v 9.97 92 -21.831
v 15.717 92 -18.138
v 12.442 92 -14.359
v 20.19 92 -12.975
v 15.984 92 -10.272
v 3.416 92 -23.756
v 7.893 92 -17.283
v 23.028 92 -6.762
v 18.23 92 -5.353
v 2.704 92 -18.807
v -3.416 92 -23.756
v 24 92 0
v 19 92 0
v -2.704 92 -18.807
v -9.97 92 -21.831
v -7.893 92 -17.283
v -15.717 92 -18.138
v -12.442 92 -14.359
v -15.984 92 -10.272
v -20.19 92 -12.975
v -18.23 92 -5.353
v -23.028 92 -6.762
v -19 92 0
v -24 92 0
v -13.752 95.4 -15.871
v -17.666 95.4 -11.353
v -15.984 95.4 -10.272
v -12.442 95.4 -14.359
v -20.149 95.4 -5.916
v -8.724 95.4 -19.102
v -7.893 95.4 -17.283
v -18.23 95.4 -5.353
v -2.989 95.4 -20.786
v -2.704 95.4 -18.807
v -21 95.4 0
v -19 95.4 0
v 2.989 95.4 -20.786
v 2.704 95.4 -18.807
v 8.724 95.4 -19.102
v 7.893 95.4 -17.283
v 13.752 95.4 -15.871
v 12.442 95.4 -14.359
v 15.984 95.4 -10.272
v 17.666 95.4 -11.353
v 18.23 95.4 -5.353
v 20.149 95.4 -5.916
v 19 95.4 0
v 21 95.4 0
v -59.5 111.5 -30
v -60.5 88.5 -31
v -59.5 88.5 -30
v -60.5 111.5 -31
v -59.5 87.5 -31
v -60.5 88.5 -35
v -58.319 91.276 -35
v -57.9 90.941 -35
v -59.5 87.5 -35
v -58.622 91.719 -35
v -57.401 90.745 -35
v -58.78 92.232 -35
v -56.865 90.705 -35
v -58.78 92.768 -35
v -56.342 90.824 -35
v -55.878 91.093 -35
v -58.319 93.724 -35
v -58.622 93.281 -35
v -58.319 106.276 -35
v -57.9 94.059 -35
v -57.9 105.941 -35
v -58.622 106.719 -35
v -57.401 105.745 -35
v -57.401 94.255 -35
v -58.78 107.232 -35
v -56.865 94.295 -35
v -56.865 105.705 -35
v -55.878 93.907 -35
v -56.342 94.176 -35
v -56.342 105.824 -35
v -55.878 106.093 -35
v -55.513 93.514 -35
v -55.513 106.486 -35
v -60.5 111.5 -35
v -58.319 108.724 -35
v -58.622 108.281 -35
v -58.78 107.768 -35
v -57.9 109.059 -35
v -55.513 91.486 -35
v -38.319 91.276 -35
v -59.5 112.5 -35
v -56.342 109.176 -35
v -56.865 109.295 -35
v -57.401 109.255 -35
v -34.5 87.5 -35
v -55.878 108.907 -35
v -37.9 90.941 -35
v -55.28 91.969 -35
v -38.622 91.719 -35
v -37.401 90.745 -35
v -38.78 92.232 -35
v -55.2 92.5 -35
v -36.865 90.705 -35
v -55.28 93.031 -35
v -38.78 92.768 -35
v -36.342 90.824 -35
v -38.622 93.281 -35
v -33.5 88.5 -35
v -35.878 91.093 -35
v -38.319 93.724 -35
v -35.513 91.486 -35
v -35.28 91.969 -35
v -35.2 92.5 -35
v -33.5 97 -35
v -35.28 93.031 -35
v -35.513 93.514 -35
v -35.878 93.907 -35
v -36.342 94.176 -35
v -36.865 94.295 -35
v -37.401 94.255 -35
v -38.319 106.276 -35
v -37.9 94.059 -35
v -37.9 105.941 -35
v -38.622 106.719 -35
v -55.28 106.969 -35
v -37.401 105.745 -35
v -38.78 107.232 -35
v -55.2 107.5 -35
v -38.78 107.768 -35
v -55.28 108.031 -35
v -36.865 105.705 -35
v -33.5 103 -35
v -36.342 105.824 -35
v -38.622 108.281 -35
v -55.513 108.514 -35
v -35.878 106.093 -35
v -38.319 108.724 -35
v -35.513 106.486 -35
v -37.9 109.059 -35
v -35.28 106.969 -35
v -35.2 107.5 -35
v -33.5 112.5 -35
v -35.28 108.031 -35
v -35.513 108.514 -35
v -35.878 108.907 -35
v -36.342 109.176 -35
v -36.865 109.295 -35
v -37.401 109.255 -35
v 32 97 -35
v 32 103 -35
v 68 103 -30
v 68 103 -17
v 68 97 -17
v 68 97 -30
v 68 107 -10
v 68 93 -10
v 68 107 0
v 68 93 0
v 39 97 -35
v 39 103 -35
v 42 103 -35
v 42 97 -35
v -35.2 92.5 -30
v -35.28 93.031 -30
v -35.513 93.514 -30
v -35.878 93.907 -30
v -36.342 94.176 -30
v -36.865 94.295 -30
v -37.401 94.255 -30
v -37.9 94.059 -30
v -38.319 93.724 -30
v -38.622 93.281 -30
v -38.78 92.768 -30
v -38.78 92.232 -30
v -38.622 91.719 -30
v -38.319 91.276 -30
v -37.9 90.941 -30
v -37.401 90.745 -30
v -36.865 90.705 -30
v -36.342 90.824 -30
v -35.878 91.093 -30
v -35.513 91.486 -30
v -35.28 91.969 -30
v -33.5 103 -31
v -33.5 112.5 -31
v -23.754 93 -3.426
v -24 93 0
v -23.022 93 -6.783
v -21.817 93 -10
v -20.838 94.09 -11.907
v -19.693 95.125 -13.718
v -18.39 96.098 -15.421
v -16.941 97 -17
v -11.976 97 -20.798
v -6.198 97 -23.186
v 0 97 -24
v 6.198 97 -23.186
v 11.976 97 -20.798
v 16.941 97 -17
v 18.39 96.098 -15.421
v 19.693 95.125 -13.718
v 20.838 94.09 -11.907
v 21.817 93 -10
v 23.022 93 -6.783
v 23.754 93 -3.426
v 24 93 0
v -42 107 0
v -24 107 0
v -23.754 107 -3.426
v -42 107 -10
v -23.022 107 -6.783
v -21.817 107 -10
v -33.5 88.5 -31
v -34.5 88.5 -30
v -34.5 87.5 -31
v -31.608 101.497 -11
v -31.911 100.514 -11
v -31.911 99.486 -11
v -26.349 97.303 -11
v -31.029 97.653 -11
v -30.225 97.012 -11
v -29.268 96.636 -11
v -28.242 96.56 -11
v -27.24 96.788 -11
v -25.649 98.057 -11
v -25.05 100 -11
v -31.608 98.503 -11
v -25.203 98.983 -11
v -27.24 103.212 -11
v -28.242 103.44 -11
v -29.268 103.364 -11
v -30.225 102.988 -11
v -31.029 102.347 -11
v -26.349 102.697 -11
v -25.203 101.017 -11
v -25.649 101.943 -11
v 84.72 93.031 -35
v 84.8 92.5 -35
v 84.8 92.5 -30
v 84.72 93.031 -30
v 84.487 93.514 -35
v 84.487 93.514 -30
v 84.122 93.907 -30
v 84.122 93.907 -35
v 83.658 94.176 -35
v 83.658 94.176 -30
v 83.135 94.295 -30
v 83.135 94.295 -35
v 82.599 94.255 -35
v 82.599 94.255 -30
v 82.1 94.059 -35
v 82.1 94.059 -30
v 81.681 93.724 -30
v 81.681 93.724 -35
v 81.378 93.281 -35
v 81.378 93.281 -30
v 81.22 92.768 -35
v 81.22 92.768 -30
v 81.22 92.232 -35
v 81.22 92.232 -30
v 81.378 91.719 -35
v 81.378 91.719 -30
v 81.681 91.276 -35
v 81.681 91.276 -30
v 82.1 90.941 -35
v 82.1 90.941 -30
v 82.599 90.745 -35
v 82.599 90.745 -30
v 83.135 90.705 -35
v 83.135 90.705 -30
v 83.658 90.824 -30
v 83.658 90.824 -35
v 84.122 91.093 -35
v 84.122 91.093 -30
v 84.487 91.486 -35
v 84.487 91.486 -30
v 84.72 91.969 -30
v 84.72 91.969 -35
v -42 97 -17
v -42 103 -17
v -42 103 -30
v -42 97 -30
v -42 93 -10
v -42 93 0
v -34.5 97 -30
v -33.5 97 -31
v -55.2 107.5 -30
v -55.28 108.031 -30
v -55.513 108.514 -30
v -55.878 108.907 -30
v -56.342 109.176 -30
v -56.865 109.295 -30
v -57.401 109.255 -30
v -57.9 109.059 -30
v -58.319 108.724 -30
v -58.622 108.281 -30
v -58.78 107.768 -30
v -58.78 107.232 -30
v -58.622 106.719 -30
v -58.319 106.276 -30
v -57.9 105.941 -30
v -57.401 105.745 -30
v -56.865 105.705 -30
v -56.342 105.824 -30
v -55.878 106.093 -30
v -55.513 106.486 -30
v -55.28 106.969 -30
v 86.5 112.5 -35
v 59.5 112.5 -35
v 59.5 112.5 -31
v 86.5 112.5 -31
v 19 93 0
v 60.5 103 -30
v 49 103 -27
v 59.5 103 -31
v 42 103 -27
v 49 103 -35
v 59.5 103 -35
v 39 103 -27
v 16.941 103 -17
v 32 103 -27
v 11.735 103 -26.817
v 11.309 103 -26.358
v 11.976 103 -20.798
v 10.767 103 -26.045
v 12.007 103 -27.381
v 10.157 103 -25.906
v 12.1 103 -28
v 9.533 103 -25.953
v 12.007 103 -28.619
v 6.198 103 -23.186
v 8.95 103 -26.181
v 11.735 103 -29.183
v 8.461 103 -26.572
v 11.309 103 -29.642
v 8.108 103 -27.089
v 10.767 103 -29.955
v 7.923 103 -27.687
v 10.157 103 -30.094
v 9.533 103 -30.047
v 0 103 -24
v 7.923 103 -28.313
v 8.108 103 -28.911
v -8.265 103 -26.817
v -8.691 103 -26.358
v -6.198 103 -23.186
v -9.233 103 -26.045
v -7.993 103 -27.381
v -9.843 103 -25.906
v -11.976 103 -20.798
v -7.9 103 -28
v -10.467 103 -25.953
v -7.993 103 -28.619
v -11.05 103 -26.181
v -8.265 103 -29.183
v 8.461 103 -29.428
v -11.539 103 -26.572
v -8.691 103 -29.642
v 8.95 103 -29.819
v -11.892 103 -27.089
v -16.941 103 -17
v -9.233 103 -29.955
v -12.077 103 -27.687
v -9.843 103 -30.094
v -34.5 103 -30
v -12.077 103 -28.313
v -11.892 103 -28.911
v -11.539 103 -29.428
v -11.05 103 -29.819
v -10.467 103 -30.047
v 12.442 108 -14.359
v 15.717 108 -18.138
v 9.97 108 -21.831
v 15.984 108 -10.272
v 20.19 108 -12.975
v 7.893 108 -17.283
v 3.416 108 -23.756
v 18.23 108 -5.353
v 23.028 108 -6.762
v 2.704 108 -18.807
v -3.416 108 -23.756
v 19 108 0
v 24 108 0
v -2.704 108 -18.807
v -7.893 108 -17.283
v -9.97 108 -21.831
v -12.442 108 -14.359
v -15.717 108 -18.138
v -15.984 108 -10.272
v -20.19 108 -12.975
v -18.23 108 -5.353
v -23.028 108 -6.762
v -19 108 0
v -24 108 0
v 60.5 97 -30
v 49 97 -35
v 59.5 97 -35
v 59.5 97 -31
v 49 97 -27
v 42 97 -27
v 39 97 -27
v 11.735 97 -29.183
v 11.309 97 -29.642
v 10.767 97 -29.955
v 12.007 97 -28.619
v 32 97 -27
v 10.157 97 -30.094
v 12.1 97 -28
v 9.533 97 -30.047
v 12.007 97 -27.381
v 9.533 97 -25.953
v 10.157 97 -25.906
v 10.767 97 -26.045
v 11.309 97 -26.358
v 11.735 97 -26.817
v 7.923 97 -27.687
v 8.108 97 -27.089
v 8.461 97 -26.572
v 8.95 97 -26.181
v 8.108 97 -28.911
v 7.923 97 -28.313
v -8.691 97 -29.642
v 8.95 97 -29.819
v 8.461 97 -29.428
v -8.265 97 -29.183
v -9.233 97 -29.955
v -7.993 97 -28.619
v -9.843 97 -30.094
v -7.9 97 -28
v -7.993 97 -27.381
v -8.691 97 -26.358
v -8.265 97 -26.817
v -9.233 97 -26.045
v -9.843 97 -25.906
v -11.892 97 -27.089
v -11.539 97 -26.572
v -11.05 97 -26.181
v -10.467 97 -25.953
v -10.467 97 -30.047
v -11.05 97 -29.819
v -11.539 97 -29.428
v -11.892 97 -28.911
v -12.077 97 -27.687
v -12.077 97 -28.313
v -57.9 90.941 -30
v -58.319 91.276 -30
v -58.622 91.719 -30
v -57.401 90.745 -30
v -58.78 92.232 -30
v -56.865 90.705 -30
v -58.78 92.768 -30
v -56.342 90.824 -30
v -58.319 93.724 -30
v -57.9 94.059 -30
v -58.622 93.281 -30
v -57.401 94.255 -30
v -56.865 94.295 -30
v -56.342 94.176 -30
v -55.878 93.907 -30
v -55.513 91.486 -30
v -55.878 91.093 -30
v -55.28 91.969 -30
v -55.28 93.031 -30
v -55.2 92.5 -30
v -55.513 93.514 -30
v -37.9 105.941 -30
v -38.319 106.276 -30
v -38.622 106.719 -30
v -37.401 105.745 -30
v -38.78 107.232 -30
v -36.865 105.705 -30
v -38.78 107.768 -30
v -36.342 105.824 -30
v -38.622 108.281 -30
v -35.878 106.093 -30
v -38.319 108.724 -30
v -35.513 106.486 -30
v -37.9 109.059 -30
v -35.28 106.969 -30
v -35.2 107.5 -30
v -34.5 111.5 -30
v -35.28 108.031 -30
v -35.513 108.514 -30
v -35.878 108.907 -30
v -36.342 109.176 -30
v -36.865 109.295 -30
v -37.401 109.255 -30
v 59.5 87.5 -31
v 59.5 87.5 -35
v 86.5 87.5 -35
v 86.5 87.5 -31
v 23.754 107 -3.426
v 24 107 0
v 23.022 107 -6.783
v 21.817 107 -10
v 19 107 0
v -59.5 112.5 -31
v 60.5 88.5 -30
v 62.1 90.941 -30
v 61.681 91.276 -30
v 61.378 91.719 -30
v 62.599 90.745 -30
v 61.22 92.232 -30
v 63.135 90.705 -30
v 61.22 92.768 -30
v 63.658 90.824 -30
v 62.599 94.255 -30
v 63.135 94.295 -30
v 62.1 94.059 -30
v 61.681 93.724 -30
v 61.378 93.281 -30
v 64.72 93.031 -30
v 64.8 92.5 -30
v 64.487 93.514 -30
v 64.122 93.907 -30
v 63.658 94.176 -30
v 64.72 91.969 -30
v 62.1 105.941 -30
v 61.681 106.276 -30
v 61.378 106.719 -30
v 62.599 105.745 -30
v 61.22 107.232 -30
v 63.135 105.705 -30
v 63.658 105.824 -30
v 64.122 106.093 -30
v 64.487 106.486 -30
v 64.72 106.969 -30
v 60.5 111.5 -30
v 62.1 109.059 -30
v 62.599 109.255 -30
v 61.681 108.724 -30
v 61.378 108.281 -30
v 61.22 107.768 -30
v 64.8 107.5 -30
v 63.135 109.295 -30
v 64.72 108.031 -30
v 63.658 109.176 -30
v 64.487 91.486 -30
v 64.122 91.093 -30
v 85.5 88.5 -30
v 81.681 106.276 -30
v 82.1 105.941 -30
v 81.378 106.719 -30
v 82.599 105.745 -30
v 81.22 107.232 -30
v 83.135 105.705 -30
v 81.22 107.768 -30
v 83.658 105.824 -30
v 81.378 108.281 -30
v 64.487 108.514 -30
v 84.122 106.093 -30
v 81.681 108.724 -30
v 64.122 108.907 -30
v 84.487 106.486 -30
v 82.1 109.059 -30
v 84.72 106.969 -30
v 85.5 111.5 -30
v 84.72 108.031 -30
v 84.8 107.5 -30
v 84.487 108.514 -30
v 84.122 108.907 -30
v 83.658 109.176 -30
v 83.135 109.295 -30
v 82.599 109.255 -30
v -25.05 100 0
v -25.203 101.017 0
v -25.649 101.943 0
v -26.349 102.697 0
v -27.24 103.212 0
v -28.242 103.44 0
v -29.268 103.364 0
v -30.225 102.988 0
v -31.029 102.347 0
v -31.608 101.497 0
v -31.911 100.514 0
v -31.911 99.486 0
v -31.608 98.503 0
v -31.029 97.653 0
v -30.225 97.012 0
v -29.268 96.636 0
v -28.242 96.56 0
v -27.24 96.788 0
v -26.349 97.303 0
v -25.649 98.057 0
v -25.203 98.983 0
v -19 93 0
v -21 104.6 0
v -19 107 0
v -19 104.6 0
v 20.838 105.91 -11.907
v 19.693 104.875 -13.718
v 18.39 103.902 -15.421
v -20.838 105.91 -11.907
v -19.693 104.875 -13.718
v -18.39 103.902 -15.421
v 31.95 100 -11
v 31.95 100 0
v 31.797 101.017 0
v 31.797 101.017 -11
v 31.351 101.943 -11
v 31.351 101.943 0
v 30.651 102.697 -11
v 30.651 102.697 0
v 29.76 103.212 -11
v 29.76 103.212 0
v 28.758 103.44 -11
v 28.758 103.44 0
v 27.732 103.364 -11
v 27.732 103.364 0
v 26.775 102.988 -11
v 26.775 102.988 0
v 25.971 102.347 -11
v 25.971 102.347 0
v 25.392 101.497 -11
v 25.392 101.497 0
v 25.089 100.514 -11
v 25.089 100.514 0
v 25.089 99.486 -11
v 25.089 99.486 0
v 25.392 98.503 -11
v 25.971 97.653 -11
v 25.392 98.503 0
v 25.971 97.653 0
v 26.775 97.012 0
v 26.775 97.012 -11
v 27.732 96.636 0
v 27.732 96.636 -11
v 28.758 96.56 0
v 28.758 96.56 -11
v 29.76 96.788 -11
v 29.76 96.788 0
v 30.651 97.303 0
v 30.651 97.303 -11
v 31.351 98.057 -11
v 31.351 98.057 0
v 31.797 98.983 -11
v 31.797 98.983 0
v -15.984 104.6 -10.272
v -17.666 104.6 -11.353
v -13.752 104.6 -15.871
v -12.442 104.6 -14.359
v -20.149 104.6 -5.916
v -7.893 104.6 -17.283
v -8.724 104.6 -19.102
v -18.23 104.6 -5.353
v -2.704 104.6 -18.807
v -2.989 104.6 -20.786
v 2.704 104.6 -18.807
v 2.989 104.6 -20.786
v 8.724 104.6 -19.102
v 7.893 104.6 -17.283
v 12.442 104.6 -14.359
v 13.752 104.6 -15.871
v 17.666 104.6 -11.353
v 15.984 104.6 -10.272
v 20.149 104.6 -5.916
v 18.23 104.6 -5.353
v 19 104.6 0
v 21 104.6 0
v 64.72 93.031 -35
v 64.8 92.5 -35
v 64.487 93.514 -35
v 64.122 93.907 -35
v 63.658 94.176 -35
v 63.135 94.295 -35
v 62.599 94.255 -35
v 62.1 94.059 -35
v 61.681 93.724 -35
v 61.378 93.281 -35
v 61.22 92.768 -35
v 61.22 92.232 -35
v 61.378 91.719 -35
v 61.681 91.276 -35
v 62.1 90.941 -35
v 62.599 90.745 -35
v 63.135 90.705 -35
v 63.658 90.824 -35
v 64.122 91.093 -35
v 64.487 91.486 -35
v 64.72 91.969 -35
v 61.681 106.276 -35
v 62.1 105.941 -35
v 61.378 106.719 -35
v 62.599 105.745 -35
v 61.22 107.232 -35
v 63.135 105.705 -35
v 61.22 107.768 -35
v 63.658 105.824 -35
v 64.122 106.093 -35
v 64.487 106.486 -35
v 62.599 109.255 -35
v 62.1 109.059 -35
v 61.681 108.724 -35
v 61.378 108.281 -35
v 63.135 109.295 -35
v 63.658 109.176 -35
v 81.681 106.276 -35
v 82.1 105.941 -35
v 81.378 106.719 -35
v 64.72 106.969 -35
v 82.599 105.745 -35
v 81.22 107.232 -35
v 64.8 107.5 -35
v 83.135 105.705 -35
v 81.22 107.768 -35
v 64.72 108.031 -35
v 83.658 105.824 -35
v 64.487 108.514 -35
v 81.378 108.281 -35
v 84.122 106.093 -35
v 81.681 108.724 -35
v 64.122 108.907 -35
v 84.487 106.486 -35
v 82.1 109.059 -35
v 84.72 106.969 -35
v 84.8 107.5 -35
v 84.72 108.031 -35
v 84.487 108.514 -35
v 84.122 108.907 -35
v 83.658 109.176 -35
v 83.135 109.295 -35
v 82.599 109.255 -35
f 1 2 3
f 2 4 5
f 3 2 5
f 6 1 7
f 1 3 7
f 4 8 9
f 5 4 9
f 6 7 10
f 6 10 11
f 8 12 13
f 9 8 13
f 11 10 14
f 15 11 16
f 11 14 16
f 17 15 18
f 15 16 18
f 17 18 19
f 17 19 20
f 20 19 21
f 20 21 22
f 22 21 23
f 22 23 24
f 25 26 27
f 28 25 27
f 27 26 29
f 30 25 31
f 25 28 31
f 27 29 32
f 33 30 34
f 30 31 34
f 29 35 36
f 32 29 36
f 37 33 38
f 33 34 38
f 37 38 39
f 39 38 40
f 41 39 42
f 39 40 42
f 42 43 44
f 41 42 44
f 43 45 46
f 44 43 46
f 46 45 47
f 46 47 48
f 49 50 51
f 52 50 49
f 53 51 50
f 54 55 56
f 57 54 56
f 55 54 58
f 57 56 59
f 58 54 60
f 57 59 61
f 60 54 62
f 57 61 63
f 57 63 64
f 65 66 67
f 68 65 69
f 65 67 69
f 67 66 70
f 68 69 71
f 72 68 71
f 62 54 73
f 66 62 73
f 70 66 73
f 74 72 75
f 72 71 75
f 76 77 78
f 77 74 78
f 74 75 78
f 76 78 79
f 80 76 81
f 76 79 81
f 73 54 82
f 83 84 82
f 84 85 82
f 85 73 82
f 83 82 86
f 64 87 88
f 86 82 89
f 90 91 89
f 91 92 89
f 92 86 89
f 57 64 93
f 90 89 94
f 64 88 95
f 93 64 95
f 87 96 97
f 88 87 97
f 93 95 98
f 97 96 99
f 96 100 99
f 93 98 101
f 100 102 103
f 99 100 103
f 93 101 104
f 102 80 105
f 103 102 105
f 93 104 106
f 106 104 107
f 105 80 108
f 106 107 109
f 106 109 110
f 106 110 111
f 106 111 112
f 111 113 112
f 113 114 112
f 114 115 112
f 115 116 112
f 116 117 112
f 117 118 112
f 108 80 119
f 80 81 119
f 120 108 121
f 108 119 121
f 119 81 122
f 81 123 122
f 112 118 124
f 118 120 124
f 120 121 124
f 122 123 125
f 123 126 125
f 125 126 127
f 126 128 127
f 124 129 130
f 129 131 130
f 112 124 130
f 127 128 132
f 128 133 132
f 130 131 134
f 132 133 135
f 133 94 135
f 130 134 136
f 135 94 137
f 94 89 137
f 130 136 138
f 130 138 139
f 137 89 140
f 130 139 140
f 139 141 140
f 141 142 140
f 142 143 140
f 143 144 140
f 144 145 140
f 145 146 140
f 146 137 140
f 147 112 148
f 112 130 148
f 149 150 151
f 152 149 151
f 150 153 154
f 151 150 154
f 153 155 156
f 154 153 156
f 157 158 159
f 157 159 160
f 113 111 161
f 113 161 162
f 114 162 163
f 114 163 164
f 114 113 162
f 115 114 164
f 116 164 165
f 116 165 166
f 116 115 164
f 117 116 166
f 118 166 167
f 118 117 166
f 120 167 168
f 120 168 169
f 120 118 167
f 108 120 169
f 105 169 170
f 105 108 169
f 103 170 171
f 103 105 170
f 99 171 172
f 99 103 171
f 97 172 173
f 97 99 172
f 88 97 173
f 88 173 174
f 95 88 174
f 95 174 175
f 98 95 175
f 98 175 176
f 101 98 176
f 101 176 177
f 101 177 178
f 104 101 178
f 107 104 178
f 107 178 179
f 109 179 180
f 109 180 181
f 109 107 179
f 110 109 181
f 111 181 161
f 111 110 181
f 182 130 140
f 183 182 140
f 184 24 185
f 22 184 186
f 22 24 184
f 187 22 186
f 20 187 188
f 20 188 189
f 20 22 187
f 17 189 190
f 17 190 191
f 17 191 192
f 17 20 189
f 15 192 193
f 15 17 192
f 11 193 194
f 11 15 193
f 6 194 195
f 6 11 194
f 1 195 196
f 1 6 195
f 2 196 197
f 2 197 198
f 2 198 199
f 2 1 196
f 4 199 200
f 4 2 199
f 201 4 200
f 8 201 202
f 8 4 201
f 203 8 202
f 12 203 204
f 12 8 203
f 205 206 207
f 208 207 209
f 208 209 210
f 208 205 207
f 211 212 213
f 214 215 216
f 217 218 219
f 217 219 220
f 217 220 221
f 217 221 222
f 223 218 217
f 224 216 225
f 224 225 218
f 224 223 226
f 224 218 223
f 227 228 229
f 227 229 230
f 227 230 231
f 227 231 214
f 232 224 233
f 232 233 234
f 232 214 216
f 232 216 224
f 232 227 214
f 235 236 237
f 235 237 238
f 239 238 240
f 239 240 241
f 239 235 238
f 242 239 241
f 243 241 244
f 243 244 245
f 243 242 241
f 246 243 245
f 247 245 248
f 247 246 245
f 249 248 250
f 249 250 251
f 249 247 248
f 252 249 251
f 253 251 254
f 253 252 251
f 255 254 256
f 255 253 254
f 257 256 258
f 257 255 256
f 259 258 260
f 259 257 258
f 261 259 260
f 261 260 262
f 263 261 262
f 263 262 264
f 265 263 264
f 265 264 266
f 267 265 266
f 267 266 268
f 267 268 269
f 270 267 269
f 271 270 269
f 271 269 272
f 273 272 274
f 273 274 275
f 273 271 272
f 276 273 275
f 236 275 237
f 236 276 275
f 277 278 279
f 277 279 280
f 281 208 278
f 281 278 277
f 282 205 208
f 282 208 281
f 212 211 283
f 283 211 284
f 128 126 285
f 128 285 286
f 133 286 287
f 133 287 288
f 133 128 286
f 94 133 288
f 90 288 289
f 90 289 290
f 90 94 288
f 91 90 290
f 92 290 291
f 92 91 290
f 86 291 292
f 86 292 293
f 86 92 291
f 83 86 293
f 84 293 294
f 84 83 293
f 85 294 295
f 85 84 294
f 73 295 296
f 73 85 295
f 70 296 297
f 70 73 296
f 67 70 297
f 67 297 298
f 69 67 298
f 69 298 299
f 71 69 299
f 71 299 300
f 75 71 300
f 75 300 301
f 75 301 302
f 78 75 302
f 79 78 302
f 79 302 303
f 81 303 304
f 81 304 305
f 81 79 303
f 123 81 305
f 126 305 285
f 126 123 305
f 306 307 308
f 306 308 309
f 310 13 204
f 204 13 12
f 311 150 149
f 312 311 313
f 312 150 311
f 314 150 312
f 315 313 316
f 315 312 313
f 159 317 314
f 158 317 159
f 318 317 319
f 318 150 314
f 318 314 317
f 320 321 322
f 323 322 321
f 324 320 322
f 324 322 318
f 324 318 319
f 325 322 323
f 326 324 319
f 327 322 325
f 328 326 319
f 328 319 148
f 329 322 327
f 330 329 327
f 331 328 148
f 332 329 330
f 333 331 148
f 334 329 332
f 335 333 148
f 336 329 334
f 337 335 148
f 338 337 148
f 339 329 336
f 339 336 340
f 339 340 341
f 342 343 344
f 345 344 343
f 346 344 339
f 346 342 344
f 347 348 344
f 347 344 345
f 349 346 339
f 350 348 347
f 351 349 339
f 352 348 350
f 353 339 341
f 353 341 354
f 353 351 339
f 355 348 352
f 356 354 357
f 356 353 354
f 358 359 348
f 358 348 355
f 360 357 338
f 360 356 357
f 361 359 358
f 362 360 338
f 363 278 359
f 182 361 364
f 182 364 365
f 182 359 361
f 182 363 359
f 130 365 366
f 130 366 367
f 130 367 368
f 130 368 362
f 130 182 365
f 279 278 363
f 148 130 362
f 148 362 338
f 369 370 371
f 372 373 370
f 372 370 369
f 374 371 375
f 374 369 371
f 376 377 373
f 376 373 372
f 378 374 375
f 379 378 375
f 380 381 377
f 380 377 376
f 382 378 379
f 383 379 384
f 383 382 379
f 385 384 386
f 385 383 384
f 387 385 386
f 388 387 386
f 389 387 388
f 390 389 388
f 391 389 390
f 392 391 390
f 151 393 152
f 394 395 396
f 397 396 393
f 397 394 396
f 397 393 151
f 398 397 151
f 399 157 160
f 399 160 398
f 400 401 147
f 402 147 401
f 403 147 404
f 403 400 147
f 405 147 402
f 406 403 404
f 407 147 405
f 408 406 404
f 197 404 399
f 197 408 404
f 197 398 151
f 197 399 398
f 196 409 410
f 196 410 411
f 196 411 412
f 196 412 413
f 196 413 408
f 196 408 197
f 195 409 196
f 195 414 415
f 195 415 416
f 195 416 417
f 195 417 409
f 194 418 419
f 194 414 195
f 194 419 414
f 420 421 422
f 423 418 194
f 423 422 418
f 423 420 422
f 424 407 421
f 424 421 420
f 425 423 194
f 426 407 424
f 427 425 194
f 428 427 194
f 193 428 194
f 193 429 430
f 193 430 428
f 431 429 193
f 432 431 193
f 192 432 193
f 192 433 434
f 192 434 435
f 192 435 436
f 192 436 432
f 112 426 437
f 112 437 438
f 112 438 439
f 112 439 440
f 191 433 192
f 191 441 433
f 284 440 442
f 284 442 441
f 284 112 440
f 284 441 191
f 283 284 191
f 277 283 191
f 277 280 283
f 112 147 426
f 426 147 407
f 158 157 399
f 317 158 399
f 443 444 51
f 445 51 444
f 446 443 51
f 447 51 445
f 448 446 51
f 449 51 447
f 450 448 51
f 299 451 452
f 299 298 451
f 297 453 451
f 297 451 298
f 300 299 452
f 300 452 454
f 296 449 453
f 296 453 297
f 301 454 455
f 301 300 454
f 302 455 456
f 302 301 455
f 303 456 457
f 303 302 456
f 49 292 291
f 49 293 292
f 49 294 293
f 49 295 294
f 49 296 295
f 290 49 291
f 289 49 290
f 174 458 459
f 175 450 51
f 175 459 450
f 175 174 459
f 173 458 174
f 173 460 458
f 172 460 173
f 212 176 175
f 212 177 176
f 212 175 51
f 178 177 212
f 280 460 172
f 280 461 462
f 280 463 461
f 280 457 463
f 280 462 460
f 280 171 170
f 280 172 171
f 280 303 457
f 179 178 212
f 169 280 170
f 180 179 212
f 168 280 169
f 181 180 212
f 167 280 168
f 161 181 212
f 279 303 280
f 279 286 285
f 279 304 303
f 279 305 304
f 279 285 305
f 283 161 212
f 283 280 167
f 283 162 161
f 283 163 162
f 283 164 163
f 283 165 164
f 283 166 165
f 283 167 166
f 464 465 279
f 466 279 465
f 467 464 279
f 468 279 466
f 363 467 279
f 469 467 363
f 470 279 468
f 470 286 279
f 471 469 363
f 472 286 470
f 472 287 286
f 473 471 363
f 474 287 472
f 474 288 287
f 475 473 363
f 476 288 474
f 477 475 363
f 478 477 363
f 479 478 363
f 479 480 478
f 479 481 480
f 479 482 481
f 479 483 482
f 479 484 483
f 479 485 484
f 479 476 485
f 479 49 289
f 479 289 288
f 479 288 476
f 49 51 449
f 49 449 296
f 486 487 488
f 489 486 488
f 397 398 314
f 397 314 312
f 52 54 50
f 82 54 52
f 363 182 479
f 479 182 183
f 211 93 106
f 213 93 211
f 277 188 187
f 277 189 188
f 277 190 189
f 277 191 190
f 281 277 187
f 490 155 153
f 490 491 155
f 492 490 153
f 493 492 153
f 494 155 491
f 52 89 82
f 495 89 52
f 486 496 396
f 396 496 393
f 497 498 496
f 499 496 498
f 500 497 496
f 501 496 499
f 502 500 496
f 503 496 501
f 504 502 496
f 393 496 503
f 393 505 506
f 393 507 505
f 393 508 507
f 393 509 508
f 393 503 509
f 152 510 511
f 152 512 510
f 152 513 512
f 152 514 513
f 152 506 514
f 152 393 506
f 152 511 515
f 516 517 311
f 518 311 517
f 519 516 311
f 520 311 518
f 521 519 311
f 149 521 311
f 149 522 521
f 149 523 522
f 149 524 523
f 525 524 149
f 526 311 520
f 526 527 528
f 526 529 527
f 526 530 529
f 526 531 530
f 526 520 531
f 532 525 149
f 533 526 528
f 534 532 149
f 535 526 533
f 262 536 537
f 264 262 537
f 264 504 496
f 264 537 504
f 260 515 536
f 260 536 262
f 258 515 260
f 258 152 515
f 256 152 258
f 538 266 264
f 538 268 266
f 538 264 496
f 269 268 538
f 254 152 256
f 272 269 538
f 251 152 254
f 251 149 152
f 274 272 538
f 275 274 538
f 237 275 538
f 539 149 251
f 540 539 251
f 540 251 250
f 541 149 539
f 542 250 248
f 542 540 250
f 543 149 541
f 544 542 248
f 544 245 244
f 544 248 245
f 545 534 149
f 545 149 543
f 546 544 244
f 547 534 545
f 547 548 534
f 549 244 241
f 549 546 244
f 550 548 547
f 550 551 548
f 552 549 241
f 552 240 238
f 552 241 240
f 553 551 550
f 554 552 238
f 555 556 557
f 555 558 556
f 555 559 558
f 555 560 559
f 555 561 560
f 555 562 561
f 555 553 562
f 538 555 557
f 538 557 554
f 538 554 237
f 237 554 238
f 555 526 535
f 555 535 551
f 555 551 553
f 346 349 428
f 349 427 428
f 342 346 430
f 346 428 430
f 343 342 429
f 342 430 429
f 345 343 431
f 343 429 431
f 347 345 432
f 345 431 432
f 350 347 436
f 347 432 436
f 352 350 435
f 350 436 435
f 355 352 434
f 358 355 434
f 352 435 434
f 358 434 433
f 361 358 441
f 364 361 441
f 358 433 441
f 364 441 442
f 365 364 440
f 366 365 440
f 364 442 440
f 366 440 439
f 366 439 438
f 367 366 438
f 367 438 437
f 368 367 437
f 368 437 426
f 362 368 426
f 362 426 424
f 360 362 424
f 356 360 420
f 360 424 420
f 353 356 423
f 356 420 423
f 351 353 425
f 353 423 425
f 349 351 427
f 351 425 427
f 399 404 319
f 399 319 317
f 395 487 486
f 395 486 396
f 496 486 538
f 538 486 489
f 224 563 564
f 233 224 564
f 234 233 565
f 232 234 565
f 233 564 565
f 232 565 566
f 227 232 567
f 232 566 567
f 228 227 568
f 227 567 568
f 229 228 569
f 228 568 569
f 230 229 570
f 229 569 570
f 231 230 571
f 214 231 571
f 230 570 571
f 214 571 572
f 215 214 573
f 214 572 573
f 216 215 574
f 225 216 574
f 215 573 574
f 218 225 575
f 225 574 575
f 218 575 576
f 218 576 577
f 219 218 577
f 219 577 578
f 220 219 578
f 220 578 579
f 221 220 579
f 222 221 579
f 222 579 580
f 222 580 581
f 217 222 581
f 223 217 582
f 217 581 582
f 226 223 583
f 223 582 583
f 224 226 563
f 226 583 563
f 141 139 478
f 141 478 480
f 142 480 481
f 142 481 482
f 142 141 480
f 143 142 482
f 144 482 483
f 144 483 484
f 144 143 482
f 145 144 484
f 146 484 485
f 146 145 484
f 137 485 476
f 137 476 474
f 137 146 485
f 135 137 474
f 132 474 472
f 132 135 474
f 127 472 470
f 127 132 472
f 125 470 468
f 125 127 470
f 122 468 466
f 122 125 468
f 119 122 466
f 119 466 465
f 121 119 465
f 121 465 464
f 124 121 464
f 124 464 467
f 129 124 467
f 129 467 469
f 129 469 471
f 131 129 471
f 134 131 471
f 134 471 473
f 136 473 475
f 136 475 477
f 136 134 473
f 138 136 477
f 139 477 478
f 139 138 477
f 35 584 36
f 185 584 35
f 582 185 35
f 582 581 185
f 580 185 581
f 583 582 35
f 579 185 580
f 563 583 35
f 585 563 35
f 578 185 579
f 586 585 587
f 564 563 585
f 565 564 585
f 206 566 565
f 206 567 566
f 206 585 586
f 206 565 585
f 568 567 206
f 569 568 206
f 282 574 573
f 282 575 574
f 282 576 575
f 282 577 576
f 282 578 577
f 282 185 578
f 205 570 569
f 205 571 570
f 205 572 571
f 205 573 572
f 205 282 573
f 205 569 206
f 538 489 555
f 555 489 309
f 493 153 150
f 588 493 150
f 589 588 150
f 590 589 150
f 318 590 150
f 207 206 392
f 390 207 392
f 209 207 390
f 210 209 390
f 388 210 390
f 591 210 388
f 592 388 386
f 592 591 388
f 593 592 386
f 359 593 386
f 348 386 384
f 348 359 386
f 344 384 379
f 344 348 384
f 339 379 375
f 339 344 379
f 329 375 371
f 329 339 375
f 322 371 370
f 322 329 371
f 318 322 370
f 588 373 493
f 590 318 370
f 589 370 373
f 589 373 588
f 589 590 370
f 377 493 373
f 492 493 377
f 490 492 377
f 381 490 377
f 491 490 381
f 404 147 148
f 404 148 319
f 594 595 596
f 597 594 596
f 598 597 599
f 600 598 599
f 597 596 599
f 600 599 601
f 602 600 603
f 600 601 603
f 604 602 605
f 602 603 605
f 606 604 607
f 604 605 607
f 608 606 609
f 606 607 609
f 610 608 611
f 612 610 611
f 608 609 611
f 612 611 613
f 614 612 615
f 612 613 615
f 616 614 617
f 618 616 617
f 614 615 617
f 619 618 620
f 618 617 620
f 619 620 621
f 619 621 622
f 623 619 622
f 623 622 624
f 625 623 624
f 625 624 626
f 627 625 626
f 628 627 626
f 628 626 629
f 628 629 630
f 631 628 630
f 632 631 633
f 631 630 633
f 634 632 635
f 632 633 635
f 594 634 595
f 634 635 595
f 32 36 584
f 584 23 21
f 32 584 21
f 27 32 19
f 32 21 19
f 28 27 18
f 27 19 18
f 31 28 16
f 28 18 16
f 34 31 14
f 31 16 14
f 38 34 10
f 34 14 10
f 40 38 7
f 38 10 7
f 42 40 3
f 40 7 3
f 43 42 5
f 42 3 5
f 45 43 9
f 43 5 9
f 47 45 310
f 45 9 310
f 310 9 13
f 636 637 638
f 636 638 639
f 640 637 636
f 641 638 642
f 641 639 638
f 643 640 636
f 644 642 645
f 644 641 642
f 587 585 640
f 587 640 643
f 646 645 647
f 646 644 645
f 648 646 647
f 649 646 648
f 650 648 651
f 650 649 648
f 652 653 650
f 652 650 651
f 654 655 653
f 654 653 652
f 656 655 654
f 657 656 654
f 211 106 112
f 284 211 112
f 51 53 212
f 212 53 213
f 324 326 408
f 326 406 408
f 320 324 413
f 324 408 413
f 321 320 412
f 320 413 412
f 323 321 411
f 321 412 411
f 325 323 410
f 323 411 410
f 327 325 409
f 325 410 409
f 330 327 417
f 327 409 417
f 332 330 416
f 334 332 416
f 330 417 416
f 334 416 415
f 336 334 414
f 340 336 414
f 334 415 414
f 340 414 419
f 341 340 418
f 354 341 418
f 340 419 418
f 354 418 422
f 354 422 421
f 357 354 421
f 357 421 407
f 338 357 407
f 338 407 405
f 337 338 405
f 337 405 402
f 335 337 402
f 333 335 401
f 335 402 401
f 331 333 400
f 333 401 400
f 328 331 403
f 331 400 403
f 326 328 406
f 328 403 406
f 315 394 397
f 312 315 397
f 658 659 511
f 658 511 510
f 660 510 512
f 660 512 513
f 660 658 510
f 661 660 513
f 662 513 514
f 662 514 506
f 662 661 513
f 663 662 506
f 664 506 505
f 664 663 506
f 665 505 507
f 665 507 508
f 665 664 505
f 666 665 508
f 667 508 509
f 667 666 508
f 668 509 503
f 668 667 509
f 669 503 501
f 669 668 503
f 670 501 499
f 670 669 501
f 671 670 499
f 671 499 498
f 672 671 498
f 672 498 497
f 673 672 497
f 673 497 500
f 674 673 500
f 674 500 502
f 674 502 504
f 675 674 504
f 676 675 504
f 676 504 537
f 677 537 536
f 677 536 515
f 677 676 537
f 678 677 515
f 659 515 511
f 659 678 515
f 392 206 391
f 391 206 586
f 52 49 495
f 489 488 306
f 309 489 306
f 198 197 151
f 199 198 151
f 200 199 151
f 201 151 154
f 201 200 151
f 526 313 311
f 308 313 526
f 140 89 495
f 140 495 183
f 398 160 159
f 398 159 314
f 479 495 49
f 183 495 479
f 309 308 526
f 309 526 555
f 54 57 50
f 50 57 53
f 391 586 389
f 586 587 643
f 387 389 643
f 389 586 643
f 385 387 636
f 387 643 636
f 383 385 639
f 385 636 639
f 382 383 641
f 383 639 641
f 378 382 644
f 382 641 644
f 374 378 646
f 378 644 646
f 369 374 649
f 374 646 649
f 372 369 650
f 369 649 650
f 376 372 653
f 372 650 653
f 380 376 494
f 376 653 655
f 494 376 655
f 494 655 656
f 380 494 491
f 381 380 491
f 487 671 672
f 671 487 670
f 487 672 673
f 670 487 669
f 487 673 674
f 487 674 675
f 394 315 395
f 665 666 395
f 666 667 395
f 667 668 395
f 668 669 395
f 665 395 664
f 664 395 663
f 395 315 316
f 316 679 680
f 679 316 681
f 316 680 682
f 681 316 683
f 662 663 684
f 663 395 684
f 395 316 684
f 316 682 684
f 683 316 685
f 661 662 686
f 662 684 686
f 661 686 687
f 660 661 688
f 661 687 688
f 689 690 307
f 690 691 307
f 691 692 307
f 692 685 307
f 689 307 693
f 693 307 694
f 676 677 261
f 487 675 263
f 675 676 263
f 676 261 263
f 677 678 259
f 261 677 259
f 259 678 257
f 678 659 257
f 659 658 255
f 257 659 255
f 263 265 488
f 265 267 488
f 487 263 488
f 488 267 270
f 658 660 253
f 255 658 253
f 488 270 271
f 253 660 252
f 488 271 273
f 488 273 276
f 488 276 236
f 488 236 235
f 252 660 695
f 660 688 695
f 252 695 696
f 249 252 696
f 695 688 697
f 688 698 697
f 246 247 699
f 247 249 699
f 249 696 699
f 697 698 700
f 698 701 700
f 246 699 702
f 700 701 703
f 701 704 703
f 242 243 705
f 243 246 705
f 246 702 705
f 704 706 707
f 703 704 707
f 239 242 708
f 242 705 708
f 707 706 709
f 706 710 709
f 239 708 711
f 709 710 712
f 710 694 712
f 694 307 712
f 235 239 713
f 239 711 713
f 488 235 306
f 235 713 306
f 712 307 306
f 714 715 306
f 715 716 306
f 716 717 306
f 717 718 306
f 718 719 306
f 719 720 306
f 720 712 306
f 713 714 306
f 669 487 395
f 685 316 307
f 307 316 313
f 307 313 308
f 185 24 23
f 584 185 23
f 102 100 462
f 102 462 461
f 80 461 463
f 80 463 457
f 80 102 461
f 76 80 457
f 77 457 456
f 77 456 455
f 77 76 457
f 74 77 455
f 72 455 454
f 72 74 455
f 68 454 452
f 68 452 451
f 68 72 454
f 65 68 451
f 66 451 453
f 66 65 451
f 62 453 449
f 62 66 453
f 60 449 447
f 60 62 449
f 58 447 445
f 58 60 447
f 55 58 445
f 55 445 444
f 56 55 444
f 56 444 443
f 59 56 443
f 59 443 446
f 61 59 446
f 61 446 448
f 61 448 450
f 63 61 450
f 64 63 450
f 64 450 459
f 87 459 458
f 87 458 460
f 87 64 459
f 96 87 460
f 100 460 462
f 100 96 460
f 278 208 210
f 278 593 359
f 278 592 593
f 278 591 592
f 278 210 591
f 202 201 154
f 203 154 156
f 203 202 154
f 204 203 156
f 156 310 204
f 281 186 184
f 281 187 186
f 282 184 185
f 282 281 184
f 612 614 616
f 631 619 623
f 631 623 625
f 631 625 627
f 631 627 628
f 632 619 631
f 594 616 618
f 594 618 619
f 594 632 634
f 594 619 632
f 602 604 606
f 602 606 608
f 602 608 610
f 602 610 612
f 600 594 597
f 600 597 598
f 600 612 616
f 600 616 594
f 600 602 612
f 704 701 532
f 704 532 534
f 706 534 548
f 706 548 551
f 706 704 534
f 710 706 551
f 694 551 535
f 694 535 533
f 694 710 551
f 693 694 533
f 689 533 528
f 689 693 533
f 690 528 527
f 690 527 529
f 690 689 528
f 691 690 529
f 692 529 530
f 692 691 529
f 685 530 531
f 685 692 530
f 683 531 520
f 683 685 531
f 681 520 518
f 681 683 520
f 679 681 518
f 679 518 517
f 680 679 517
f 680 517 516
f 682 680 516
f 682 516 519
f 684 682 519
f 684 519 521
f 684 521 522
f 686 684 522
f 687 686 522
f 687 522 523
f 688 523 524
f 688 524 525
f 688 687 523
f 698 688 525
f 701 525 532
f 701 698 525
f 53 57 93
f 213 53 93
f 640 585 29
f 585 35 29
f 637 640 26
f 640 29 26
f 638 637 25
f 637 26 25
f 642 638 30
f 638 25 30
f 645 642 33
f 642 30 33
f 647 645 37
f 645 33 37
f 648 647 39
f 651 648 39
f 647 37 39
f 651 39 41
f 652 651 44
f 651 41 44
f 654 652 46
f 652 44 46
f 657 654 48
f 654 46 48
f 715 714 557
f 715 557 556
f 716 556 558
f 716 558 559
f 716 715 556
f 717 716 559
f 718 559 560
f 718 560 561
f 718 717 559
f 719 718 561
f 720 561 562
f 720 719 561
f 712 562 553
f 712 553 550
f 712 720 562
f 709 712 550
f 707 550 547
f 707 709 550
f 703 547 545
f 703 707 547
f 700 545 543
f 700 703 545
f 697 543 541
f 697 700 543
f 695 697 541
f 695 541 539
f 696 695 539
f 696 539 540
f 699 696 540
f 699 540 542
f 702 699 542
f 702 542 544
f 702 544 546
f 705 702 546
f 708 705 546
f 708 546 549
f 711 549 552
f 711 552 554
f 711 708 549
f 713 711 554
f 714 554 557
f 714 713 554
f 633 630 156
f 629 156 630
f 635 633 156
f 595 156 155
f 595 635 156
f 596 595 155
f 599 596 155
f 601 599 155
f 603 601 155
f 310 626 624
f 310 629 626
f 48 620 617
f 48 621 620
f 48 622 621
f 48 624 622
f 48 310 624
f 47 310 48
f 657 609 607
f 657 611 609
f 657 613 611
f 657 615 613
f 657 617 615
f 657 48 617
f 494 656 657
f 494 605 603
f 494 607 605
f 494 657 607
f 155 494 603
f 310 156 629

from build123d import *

# Parameters (mm, degrees)
PAD_DEPTH            = 110
SKETCH002_R          = 3.45
POCKET001_DEPTH      = 11
SKETCH004_R          = 2.1
POCKET003_DEPTH      = 7.001
POCKET003_DEPTH_BACK = 7.001
SKETCH005_W          = 7
SKETCH005_H          = 8
POCKET004_DEPTH      = 7.001
POCKET004_DEPTH_BACK = 7.001
PAD001_DEPTH         = 8
SKETCH003_R          = 19
POCKET_DEPTH         = 9
SKETCH001_R          = 21
POCKET005_DEPTH      = 4.6
SKETCH007_W          = 27
SKETCH007_H          = 25
SKETCH007_R          = 1.8
PAD002_DEPTH         = 5
LINEARPATTERN_COUNT  = 2
LINEARPATTERN_PITCH  = 120
CHAMFER002_SIZE      = 1
CHAMFER003_SIZE      = 1


with BuildPart() as part:
    # Sketch → Pad (new body)
    with BuildSketch(Plane.YZ.offset(-42)):
        Polygon((-7, 0), (7, 0), (7, -10), (3, -17), (3, -35), (-3, -35), (-3, -17), (-7, -10), align=None)
    extrude(amount=PAD_DEPTH)

    # Sketch002 → Pocket001 (cut)
    with BuildSketch(Plane.XY):
        with Locations((-28.5, 0)):
            Circle(SKETCH002_R)
        with Locations((28.5, 0)):
            Circle(SKETCH002_R)
    extrude(amount=-POCKET001_DEPTH, mode=Mode.SUBTRACT)

    # Sketch004 → Pocket003 (cut, two sides)
    with BuildSketch(Plane.XZ) as pocket003_sk:
        with Locations((-10, -28)):
            Circle(SKETCH004_R)
        with Locations((10, -28)):
            Circle(SKETCH004_R)
    extrude(amount=-POCKET003_DEPTH, mode=Mode.SUBTRACT)
    extrude(pocket003_sk.sketch, amount=POCKET003_DEPTH_BACK, mode=Mode.SUBTRACT)

    # Sketch005 → Pocket004 (cut, two sides)
    with BuildSketch(Plane.XZ) as pocket004_sk:
        with Locations((35.5, -31)):
            Rectangle(SKETCH005_W, SKETCH005_H)
        with Locations((45.5, -31)):
            Rectangle(SKETCH005_W, SKETCH005_H)
    extrude(amount=-POCKET004_DEPTH, mode=Mode.SUBTRACT)
    extrude(pocket004_sk.sketch, amount=POCKET004_DEPTH_BACK, mode=Mode.SUBTRACT)

    # Sketch006 → Pad001 (join, symmetric)
    with BuildSketch(Plane.XZ):
        with BuildLine():
            Line((-24, 0), (24, -5.7e-05))
            ThreePointArc((-24, 0), (-2.8e-05, -24), (24, -5.7e-05))
        make_face()
    extrude(amount=PAD001_DEPTH, both=True)

    # Sketch003 → Pocket (cut, symmetric)
    with BuildSketch(Plane.XZ):
        Circle(SKETCH003_R)
    extrude(amount=POCKET_DEPTH, both=True, mode=Mode.SUBTRACT)

    # Sketch001 → Pocket005 (cut, symmetric)
    with BuildSketch(Plane.XZ):
        Circle(SKETCH001_R)
    extrude(amount=POCKET005_DEPTH, both=True, mode=Mode.SUBTRACT)

    # Sketch007 → Pad002 (join)
    with BuildSketch(Plane(origin=(-123, -11.5, -35), x_dir=(1, 0, 0), z_dir=(0, 0, 1))):
        with Locations((76, 11.5)):
            Rectangle(SKETCH007_W, SKETCH007_H)
        with Locations((66, 19)):
            Circle(SKETCH007_R, mode=Mode.SUBTRACT)
        with Locations((86, 19)):
            Circle(SKETCH007_R, mode=Mode.SUBTRACT)
        with Locations((86, 4)):
            Circle(SKETCH007_R, mode=Mode.SUBTRACT)
        with Locations((66, 4)):
            Circle(SKETCH007_R, mode=Mode.SUBTRACT)
    pad002 = extrude(amount=PAD002_DEPTH)

    # LinearPattern: Pad002 ×2
    with Locations(*[(i * LINEARPATTERN_PITCH, 0, 0) for i in range(1, LINEARPATTERN_COUNT)]):
        add(pad002)

    # Chamfer002
    chamfer002_edges = [part.edges().sort_by_distance(p)[0] for p in [
        (73, -12.5, -30),
        (73, 12.5, -30),
        (86.5, 0, -30),
        (59.5, -7.75, -30),
        (59.5, 7.75, -30),
    ]]
    chamfer(chamfer002_edges, length=CHAMFER002_SIZE)

    # Chamfer003
    chamfer003_edges = [part.edges().sort_by_distance(p)[0] for p in [
        (-47, -12.5, -30),
        (-33.5, -7.75, -30),
        (-60.5, 0, -30),
        (-47, 12.5, -30),
        (-60.5, -12.5, -32.5),
        (-33.5, -12.5, -32.5),
        (-60.5, 12.5, -32.5),
        (-33.5, 7.75, -30),
    ]]
    chamfer(chamfer003_edges, length=CHAMFER003_SIZE)


with BuildPart() as part_1:
    # Body001 placement: moved
    add(part.part.moved(Location((0, 100, 0))))


solid = part_1.part
